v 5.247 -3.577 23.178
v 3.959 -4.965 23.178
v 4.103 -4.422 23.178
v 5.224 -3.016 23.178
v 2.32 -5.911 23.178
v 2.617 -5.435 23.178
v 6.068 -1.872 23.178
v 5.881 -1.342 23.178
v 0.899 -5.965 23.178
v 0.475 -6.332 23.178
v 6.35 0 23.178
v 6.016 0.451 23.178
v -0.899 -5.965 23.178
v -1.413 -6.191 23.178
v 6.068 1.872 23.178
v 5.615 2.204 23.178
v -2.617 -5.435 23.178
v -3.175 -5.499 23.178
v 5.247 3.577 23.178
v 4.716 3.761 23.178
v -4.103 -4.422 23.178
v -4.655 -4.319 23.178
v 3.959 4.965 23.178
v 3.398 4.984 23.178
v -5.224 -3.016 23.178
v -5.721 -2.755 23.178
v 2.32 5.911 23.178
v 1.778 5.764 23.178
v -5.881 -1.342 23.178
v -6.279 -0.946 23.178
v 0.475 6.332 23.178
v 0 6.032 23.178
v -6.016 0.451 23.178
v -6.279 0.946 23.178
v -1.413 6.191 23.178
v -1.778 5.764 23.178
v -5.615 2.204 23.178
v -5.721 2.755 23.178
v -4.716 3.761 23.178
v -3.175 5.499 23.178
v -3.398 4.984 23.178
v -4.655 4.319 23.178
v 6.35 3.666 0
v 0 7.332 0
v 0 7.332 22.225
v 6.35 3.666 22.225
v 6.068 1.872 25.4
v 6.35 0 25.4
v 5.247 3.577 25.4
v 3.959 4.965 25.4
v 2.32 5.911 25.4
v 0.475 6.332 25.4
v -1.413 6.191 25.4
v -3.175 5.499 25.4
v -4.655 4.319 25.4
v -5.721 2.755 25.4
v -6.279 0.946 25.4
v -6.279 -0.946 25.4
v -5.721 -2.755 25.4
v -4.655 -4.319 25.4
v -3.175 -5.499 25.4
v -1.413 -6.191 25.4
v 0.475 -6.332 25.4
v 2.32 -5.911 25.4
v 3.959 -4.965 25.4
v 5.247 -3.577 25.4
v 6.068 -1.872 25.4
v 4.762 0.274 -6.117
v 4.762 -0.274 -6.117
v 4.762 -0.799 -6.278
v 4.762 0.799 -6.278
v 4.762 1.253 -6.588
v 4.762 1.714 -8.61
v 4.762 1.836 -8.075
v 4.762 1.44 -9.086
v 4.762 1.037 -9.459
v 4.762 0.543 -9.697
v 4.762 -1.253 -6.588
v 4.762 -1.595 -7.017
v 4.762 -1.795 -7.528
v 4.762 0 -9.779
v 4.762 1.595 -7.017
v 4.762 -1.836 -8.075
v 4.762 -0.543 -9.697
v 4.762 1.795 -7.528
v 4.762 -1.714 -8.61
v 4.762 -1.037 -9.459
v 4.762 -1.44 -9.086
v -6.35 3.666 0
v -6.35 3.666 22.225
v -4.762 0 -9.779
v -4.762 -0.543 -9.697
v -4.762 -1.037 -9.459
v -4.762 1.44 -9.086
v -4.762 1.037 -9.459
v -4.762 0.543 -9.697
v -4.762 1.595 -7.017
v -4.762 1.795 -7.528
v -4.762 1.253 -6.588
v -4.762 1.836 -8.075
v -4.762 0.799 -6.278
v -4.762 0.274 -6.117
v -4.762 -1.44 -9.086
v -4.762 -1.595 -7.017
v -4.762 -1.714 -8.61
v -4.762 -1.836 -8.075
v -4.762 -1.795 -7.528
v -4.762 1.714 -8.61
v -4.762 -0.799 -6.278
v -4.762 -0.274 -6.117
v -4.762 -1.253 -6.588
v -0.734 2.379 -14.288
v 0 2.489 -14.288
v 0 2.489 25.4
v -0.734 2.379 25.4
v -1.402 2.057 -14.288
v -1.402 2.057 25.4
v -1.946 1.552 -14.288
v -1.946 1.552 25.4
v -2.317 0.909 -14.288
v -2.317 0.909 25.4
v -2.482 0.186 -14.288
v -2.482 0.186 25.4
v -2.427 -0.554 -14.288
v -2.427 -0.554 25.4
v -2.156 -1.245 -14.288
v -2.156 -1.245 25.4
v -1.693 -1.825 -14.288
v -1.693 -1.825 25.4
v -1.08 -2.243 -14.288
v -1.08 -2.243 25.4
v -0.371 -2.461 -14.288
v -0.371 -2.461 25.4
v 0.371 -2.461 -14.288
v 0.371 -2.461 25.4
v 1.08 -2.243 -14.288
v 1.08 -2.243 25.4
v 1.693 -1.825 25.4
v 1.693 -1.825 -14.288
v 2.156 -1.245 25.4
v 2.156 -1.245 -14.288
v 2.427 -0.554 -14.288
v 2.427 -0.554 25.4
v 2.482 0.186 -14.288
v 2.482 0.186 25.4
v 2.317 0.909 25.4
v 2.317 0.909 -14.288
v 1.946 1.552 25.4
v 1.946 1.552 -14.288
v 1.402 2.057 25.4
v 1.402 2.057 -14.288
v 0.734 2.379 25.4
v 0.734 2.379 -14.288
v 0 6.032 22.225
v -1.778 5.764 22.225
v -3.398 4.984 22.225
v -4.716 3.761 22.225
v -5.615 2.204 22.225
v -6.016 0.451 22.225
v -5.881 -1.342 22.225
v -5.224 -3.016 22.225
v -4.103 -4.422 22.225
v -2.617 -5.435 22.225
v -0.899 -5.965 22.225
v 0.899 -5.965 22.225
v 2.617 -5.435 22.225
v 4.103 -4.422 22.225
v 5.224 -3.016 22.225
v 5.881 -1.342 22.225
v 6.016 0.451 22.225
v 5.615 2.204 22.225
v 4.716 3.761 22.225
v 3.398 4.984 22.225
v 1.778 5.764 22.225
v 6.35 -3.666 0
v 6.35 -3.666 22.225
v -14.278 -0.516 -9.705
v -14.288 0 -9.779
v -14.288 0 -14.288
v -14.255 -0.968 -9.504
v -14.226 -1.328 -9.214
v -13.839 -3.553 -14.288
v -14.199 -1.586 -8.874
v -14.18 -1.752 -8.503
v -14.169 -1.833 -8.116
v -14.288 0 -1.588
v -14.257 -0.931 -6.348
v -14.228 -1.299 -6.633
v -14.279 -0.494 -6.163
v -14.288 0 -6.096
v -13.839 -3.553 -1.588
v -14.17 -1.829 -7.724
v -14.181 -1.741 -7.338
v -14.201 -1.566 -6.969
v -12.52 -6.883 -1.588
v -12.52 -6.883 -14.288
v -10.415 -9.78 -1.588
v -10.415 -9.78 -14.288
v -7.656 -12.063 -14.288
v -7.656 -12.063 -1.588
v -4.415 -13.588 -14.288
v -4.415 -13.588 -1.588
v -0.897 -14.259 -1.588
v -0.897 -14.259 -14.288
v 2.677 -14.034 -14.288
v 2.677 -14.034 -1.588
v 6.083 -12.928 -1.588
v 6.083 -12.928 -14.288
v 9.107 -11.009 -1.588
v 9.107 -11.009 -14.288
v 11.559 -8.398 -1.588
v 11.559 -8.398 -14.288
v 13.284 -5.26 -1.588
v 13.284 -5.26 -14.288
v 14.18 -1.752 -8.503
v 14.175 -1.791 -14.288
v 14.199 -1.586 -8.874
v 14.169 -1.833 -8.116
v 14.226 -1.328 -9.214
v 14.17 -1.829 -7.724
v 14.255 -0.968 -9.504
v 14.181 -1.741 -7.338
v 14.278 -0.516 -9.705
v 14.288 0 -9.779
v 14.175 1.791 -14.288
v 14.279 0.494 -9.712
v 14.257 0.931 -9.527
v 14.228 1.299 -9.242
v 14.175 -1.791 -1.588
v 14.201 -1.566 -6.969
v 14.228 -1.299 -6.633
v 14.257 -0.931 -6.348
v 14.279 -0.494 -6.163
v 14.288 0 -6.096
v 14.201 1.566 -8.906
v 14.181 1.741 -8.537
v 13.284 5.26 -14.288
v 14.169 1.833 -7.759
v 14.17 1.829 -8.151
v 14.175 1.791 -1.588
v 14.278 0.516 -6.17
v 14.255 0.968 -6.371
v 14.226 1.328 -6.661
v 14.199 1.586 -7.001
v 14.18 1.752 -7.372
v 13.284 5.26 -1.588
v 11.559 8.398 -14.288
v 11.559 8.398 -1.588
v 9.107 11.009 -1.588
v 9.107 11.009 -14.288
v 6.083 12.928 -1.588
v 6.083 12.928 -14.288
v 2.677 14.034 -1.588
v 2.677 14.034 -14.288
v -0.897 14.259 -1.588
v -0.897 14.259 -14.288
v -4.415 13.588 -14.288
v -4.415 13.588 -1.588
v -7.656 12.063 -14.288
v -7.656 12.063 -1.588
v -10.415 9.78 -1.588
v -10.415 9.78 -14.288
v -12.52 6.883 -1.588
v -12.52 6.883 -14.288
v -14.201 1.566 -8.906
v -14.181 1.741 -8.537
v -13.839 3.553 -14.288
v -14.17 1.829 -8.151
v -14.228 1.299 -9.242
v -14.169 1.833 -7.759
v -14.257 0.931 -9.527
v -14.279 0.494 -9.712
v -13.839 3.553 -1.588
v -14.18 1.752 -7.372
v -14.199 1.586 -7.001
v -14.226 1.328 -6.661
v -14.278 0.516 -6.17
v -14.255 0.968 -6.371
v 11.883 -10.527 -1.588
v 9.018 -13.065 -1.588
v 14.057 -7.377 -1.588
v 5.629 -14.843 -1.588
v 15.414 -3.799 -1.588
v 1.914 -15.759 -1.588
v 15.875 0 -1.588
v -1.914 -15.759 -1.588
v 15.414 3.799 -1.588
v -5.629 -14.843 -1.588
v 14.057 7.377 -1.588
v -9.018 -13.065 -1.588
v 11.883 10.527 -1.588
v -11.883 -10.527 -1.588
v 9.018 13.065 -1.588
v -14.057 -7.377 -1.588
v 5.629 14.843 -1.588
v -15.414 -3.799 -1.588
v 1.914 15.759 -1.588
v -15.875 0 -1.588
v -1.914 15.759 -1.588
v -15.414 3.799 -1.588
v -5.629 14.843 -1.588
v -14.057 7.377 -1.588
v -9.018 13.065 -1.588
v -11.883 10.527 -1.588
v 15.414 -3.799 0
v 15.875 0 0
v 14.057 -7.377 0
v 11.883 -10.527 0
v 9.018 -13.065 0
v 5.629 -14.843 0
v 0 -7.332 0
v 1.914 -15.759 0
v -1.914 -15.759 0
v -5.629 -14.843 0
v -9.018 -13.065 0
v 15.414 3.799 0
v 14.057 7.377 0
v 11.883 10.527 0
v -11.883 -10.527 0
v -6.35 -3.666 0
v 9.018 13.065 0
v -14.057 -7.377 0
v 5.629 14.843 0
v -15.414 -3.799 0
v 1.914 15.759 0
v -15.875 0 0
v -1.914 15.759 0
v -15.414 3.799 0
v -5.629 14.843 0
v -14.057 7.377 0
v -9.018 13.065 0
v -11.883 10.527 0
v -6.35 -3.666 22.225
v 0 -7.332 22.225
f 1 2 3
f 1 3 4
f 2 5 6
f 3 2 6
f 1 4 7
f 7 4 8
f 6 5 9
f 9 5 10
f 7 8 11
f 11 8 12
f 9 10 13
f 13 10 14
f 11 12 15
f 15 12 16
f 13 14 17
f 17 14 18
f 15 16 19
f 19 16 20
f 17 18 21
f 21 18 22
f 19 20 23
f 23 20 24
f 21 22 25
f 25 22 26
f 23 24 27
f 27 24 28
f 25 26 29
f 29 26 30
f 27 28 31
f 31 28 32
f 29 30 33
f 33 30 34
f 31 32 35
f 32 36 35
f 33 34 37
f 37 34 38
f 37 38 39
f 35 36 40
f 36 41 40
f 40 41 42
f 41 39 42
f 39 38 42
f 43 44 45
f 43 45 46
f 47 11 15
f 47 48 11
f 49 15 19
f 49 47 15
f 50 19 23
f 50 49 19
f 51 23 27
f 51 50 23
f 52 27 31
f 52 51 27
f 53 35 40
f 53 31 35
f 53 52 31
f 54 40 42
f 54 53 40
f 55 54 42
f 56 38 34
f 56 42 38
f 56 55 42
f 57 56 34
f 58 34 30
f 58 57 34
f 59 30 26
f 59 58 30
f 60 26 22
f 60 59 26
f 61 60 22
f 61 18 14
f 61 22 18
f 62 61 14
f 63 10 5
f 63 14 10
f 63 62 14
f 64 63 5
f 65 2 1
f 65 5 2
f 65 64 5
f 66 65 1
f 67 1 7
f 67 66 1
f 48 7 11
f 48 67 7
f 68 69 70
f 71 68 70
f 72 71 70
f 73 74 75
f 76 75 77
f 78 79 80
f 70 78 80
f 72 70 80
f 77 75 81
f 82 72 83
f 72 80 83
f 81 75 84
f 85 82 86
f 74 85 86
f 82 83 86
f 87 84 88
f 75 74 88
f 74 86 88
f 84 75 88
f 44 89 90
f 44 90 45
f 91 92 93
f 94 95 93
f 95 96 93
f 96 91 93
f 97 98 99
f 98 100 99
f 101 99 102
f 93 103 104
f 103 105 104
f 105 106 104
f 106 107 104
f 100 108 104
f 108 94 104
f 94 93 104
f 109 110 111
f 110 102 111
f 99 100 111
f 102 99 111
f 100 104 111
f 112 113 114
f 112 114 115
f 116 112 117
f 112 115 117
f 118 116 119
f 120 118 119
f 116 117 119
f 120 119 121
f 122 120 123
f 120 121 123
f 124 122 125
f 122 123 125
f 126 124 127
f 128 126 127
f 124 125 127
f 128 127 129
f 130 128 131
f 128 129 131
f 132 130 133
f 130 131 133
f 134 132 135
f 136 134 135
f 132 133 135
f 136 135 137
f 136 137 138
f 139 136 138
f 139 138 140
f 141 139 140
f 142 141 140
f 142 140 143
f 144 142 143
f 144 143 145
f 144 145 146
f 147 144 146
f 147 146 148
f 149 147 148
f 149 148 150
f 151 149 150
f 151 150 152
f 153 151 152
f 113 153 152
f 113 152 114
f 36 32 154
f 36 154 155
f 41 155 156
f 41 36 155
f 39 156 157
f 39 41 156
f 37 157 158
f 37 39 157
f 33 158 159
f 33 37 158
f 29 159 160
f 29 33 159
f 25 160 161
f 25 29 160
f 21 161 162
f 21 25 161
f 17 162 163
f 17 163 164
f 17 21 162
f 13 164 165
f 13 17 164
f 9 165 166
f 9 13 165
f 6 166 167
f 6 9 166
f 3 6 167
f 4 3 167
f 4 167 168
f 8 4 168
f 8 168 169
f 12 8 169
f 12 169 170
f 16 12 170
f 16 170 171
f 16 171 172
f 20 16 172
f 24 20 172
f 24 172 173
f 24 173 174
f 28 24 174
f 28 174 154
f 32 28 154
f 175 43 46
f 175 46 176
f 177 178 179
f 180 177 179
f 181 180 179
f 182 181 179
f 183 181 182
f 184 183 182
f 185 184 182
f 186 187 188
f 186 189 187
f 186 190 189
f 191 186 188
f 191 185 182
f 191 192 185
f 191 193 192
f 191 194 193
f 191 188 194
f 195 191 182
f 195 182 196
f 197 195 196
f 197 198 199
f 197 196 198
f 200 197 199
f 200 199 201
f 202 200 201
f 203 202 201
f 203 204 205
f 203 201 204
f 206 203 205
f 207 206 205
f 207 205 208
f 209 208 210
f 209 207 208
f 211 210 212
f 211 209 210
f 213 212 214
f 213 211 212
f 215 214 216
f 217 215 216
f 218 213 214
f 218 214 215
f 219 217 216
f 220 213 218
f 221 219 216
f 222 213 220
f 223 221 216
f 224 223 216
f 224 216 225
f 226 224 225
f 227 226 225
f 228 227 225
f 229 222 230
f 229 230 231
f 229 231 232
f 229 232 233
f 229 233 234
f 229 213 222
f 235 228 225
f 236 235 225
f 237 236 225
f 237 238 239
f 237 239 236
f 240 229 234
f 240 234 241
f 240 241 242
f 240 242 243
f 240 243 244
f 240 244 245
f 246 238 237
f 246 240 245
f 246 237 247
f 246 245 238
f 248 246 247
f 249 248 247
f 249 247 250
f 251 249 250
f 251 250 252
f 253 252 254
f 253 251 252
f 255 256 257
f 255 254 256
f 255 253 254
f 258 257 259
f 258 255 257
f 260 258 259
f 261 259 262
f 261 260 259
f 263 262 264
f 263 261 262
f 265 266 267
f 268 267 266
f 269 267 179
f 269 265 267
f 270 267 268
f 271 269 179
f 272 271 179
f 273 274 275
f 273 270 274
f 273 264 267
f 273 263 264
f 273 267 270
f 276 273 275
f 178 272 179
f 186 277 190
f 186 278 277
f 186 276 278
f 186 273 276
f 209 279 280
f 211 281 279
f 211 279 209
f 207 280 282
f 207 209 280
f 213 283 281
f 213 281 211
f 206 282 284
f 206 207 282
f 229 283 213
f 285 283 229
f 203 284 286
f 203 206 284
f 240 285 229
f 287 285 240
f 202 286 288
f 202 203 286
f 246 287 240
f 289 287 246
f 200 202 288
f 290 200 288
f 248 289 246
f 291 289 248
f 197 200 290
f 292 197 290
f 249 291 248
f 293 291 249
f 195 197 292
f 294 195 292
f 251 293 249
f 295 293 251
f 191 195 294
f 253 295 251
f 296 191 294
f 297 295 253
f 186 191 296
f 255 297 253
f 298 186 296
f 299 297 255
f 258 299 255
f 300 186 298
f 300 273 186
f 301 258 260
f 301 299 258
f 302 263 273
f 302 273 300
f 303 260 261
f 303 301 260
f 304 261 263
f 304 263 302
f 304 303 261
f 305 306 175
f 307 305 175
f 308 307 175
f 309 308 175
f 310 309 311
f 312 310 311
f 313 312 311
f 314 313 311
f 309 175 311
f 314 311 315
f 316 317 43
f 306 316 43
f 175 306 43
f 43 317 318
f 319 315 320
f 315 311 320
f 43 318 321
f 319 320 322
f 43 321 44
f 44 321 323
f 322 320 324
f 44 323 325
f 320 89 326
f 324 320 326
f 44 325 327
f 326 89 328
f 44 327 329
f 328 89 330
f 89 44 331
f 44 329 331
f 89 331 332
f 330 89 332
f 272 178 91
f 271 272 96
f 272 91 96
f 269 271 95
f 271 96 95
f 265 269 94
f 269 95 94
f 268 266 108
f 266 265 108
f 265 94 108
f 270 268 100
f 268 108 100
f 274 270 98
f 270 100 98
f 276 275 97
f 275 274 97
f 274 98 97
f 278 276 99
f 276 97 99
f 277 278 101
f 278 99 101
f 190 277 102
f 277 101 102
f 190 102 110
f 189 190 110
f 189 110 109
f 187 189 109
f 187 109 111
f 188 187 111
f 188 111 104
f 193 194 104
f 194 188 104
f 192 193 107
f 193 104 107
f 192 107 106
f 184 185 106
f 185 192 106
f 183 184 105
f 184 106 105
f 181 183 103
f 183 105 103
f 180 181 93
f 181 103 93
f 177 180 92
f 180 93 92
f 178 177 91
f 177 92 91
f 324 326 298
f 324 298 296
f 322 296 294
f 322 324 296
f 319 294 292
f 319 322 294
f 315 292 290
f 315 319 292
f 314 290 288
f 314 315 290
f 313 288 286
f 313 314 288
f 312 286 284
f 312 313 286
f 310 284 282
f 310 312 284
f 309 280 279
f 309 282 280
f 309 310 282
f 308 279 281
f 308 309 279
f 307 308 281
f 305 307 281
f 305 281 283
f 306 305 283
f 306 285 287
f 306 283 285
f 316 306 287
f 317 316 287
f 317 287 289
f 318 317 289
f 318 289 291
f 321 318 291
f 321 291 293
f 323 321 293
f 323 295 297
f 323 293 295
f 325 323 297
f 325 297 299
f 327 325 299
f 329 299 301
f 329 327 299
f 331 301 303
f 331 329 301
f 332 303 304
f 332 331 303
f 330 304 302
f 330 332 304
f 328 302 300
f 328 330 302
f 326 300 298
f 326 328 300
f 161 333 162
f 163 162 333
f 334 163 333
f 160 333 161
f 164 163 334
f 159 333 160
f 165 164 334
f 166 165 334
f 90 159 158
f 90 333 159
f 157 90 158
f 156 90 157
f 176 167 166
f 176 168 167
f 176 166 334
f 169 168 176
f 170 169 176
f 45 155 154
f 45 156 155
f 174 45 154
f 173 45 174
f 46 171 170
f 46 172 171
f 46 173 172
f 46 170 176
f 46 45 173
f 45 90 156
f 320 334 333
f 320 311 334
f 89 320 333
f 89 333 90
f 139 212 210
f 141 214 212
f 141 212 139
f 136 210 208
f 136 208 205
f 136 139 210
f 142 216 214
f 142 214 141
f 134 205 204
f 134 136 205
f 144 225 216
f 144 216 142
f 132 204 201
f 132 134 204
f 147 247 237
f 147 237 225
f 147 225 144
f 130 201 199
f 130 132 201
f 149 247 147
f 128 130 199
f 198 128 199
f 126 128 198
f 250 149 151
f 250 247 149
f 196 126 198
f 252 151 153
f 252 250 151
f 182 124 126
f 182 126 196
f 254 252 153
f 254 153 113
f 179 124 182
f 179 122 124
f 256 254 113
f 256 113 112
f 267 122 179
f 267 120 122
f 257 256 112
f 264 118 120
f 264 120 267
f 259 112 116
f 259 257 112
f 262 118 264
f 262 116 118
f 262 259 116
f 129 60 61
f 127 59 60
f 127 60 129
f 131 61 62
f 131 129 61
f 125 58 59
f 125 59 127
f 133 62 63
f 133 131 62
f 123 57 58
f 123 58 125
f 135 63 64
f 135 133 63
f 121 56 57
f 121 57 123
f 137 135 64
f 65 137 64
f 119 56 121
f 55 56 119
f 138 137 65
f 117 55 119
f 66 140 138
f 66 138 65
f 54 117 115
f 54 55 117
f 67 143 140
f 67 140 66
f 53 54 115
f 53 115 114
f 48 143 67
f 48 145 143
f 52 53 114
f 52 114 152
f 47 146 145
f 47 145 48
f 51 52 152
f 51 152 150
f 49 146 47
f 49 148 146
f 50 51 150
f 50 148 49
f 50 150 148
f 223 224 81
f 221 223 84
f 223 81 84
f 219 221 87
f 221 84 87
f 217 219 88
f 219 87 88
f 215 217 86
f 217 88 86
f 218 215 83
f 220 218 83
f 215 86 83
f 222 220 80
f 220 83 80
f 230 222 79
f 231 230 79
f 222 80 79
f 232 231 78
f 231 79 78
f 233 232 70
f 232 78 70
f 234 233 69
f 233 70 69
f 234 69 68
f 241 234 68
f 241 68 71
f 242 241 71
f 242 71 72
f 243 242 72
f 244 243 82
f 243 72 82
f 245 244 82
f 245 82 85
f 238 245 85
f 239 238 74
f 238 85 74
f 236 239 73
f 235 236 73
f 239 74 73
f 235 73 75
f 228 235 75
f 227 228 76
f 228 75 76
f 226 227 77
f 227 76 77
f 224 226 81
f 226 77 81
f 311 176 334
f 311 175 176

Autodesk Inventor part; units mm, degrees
ref_plane "YZ Plane" through (0, 0, 0) normal (1, 0, 0) x (0, 1, 0)
ref_plane "XZ Plane" through (0, 0, 0) normal (0, 1, 0) x (-1, 0, 0)
sketch "Sketch1" plane through (0, 0, 0) normal (0, 0, 1) x (1, 0, 0)
  line L0 (0, 7.3323) -> (6.35, 3.6662)
  line L1 (6.35, 3.6662) -> (6.35, -3.6662)
  line L2 (6.35, -3.6662) -> (0, -7.3323)
  line L3 (0, -7.3323) -> (-6.35, -3.6662)
  line L4 (-6.35, -3.6662) -> (-6.35, 3.6662)
  line L5 (-6.35, 3.6662) -> (0, 7.3323)
  point P0 (0, 0)
  point P1 (0, 0)
  dimension "d0" = 12.7
extrude "Extrusion1" add sketch "Sketch1" along normal blind 25.4
sketch "Sketch2" plane through (0, 0, 0) normal (0, 0, -1) x (-1, 0, 0)
  circle A0 centre (0, 0) radius 15.875
  dimension "d3" = 31.75
extrude "Extrusion2" add sketch "Sketch2" along normal blind 1.5875
sketch "Sketch3" plane through (0, 0, -1.5875) normal (0, 0, -1) x (-1, 0, 0)
  circle A0 centre (0, 0) radius 14.2875
  dimension "d6" = 28.575
extrude "Extrusion3" add sketch "Sketch3" along normal blind 12.7
sketch "Sketch4" plane through (0, 0, -14.2875) normal (0, 0, -1) x (-1, 0, 0)
  circle A0 centre (0, 0) radius 14.2875 construction
hole "Hole1" at (0, 0, -14.2875) direction (0, 0, 1) diameter 4.9784 end through all thread size "1/4-20 UNC" class "2B" standard "ANSI Unified Screw Threads"
ref_plane "Work Plane1" through (14.2875, 0, -1.5875) normal (1, 0, 0) x (0, 1, 0)
sketch "Sketch5" plane through (14.2875, 0, -1.5875) normal (1, 0, 0) x (0, 1, 0)
  line L0 (-14.2875, -12.7) -> (14.2875, -12.7) construction
  line L1 (14.2875, 0) -> (-14.2875, 0) construction
  line L2 (14.2875, 0) -> (14.2875, -12.7) construction
  line L3 (14.2875, 0) -> (14.2875, -12.7) construction
  point P0 (0, 1.5875)
  point P1 (0, -6.35)
  point P2 (14.2875, -6.35)
hole "Hole2" at (14.2875, 0, -7.9375) direction (-1, 0, 0) diameter 3.683 depth 9.525 thread size "10-24 UNC" class "2B" standard "ANSI Unified Screw Threads"
mirror "Mirror1" about plane through (0, 0, 0) normal (1, 0, 0) of "Hole2"
sketch "Sketch6" plane through (0, 0, 25.4) normal (0, 0, 1) x (1, 0, 0)
  circle A0 centre (0, 0) radius 6.35
  circle A1 centre (0, 0) radius 15.875 construction
  line L0 (6.35, 3.6662) -> (6.35, -3.6662) construction
  line L1 (6.35, -3.6662) -> (0, -7.3323) construction
  line L2 (0, -7.3323) -> (-6.35, -3.6662) construction
  line L3 (-6.35, -3.6662) -> (-6.35, 3.6662) construction
  line L4 (-6.35, 3.6662) -> (0, 7.3323) construction
  line L5 (0, 7.3323) -> (6.35, 3.6662) construction
  line L6 (0, 7.3323) -> (6.35, 3.6662)
  line L7 (6.35, 3.6662) -> (6.35, -3.6662)
  line L8 (6.35, -3.6662) -> (0, -7.3323)
  line L9 (0, -7.3323) -> (-6.35, -3.6662)
  line L10 (-6.35, -3.6662) -> (-6.35, 3.6662)
  line L11 (-6.35, 3.6662) -> (0, 7.3323)
extrude "Extrusion4" cut sketch "Sketch6" against normal blind 3.175 contours L7 L8 A0 | A0 L6 L7 | A0 L11 L6 | L8 L9 A0 | A0 L10 L11 | L9 L10 A0
sketch "Sketch7" plane through (0, 0, 0) normal (1, 0, 0) x (0, 1, 0)
  line L0 (14.2875, -1.5875) -> (14.2875, -14.2875) construction
  line L1 (14.2875, -14.2875) -> (2.4892, -14.2875) construction
  line L2 (2.4892, -14.2875) -> (2.4892, 25.4) construction
  line L3 (2.4892, 25.4) -> (6.35, 25.4) construction
  line L4 (6.35, 25.4) -> (6.35, 22.225) construction
  line L5 (6.35, 22.225) -> (7.3323, 22.225) construction
  line L6 (7.3323, 22.225) -> (7.3323, 0) construction
  line L7 (7.3323, 0) -> (15.875, 0) construction
  line L8 (15.875, 0) -> (15.875, -1.5875) construction
  line L9 (15.875, -1.5875) -> (14.2875, -1.5875) construction
  line L10 (-15.875, 0) -> (-7.3323, 0) construction
  line L11 (-7.3323, 0) -> (-7.3323, 22.225) construction
  line L12 (-7.3323, 22.225) -> (-6.35, 22.225) construction
  line L13 (-6.35, 22.225) -> (-6.35, 25.4) construction
  line L14 (-6.35, 25.4) -> (-2.4892, 25.4) construction
  line L15 (-2.4892, 25.4) -> (-2.4892, -14.2875) construction
  line L16 (-2.4892, -14.2875) -> (-14.2875, -14.2875) construction
  line L17 (-14.2875, -14.2875) -> (-14.2875, -1.5875) construction
  line L18 (-14.2875, -1.5875) -> (-15.875, -1.5875) construction
  line L19 (-15.875, -1.5875) -> (-15.875, 0) construction
  line L20 (6.35, 22.225) -> (6.0325, 22.225)
  line L21 (6.0325, 22.225) -> (6.0325, 23.1775)
  line L22 (6.0325, 23.1775) -> (6.35, 23.1775)
  line L23 (6.35, 23.1775) -> (6.35, 22.225)
  line L24 (0, -22.225) -> (0, 33.3375) projected
  point P0 (0, 0)
  dimension "d25" = 0.3175
  dimension "d26" = 0.9525
revolve "Revolution1" cut sketch "Sketch7" angle 360 about axis through (0, 0, -10) along (0, 0, 1)
sketch "Sketch8" plane through (0, 0, 25.4) normal (0, 0, 1) x (1, 0, 0)
  circle A0 centre (0, 0) radius 6.35 projected
  circle A1 centre (0, 0) radius 2.4892 projected
  circle A2 centre (0, 0) radius 15.875 projected
  line L0 (6.35, 3.6662) -> (6.35, -3.6662) projected
  line L1 (6.35, -3.6662) -> (0, -7.3323) projected
  line L2 (0, -7.3323) -> (-6.35, -3.6662) projected
  line L3 (-6.35, -3.6662) -> (-6.35, 3.6662) projected
  line L4 (-6.35, 3.6662) -> (0, 7.3323) projected
  line L5 (0, 7.3323) -> (6.35, 3.6662) projected
extrude "Extrusion5" [suppressed]
properties part number "WCP-0102" material "Aluminum 6061"
